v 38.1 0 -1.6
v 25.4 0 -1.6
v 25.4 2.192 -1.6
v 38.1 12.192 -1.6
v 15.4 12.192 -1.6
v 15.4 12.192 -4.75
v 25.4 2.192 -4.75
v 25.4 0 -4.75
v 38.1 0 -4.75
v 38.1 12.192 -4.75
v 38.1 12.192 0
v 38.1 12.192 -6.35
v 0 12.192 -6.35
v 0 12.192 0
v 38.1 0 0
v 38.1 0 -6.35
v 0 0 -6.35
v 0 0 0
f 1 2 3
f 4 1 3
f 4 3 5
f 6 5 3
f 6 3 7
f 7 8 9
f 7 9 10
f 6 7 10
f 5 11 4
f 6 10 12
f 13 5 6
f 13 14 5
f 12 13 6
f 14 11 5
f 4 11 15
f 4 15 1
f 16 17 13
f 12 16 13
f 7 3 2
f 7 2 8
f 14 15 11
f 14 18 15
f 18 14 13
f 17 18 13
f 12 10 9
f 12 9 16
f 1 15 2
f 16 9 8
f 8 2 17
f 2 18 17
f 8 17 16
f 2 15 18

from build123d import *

# Parameters (mm, degrees)
SKETCH1_W           = 6.35
SKETCH1_H           = 12.192
BOSS_EXTRUDE1_DEPTH = 25.4
SKETCH2_W           = 1.6002
SKETCH2_H           = 12.192
BOSS_EXTRUDE2_DEPTH = 12.7
CHAMFER1_SIZE       = 10


with BuildPart() as part:
    # Sketch1 → Boss-Extrude1 (new body)
    with BuildSketch(Plane(origin=(0, 0, 0), x_dir=(0, 0, -1), z_dir=(1, 0, 0))):
        with Locations((3.175, 6.096)):
            Rectangle(SKETCH1_W, SKETCH1_H)
    extrude(amount=BOSS_EXTRUDE1_DEPTH)

    # Sketch2 → Boss-Extrude2 (add)
    with BuildSketch(Plane(origin=(25.4, 0, 0), x_dir=(0, 0, -1), z_dir=(1, 0, 0))):
        with Locations((0.8001, 6.096)):
            Rectangle(SKETCH2_W, SKETCH2_H)
        with Locations((5.5499, 6.096)):
            Rectangle(SKETCH2_W, SKETCH2_H)
    extrude(amount=BOSS_EXTRUDE2_DEPTH)

    # Chamfer1
    chamfer1_edges = [part.edges().sort_by_distance(p)[0] for p in [
        (25.4, 12.192, -3.175),
    ]]
    chamfer(chamfer1_edges, length=CHAMFER1_SIZE)


solid = part.part
